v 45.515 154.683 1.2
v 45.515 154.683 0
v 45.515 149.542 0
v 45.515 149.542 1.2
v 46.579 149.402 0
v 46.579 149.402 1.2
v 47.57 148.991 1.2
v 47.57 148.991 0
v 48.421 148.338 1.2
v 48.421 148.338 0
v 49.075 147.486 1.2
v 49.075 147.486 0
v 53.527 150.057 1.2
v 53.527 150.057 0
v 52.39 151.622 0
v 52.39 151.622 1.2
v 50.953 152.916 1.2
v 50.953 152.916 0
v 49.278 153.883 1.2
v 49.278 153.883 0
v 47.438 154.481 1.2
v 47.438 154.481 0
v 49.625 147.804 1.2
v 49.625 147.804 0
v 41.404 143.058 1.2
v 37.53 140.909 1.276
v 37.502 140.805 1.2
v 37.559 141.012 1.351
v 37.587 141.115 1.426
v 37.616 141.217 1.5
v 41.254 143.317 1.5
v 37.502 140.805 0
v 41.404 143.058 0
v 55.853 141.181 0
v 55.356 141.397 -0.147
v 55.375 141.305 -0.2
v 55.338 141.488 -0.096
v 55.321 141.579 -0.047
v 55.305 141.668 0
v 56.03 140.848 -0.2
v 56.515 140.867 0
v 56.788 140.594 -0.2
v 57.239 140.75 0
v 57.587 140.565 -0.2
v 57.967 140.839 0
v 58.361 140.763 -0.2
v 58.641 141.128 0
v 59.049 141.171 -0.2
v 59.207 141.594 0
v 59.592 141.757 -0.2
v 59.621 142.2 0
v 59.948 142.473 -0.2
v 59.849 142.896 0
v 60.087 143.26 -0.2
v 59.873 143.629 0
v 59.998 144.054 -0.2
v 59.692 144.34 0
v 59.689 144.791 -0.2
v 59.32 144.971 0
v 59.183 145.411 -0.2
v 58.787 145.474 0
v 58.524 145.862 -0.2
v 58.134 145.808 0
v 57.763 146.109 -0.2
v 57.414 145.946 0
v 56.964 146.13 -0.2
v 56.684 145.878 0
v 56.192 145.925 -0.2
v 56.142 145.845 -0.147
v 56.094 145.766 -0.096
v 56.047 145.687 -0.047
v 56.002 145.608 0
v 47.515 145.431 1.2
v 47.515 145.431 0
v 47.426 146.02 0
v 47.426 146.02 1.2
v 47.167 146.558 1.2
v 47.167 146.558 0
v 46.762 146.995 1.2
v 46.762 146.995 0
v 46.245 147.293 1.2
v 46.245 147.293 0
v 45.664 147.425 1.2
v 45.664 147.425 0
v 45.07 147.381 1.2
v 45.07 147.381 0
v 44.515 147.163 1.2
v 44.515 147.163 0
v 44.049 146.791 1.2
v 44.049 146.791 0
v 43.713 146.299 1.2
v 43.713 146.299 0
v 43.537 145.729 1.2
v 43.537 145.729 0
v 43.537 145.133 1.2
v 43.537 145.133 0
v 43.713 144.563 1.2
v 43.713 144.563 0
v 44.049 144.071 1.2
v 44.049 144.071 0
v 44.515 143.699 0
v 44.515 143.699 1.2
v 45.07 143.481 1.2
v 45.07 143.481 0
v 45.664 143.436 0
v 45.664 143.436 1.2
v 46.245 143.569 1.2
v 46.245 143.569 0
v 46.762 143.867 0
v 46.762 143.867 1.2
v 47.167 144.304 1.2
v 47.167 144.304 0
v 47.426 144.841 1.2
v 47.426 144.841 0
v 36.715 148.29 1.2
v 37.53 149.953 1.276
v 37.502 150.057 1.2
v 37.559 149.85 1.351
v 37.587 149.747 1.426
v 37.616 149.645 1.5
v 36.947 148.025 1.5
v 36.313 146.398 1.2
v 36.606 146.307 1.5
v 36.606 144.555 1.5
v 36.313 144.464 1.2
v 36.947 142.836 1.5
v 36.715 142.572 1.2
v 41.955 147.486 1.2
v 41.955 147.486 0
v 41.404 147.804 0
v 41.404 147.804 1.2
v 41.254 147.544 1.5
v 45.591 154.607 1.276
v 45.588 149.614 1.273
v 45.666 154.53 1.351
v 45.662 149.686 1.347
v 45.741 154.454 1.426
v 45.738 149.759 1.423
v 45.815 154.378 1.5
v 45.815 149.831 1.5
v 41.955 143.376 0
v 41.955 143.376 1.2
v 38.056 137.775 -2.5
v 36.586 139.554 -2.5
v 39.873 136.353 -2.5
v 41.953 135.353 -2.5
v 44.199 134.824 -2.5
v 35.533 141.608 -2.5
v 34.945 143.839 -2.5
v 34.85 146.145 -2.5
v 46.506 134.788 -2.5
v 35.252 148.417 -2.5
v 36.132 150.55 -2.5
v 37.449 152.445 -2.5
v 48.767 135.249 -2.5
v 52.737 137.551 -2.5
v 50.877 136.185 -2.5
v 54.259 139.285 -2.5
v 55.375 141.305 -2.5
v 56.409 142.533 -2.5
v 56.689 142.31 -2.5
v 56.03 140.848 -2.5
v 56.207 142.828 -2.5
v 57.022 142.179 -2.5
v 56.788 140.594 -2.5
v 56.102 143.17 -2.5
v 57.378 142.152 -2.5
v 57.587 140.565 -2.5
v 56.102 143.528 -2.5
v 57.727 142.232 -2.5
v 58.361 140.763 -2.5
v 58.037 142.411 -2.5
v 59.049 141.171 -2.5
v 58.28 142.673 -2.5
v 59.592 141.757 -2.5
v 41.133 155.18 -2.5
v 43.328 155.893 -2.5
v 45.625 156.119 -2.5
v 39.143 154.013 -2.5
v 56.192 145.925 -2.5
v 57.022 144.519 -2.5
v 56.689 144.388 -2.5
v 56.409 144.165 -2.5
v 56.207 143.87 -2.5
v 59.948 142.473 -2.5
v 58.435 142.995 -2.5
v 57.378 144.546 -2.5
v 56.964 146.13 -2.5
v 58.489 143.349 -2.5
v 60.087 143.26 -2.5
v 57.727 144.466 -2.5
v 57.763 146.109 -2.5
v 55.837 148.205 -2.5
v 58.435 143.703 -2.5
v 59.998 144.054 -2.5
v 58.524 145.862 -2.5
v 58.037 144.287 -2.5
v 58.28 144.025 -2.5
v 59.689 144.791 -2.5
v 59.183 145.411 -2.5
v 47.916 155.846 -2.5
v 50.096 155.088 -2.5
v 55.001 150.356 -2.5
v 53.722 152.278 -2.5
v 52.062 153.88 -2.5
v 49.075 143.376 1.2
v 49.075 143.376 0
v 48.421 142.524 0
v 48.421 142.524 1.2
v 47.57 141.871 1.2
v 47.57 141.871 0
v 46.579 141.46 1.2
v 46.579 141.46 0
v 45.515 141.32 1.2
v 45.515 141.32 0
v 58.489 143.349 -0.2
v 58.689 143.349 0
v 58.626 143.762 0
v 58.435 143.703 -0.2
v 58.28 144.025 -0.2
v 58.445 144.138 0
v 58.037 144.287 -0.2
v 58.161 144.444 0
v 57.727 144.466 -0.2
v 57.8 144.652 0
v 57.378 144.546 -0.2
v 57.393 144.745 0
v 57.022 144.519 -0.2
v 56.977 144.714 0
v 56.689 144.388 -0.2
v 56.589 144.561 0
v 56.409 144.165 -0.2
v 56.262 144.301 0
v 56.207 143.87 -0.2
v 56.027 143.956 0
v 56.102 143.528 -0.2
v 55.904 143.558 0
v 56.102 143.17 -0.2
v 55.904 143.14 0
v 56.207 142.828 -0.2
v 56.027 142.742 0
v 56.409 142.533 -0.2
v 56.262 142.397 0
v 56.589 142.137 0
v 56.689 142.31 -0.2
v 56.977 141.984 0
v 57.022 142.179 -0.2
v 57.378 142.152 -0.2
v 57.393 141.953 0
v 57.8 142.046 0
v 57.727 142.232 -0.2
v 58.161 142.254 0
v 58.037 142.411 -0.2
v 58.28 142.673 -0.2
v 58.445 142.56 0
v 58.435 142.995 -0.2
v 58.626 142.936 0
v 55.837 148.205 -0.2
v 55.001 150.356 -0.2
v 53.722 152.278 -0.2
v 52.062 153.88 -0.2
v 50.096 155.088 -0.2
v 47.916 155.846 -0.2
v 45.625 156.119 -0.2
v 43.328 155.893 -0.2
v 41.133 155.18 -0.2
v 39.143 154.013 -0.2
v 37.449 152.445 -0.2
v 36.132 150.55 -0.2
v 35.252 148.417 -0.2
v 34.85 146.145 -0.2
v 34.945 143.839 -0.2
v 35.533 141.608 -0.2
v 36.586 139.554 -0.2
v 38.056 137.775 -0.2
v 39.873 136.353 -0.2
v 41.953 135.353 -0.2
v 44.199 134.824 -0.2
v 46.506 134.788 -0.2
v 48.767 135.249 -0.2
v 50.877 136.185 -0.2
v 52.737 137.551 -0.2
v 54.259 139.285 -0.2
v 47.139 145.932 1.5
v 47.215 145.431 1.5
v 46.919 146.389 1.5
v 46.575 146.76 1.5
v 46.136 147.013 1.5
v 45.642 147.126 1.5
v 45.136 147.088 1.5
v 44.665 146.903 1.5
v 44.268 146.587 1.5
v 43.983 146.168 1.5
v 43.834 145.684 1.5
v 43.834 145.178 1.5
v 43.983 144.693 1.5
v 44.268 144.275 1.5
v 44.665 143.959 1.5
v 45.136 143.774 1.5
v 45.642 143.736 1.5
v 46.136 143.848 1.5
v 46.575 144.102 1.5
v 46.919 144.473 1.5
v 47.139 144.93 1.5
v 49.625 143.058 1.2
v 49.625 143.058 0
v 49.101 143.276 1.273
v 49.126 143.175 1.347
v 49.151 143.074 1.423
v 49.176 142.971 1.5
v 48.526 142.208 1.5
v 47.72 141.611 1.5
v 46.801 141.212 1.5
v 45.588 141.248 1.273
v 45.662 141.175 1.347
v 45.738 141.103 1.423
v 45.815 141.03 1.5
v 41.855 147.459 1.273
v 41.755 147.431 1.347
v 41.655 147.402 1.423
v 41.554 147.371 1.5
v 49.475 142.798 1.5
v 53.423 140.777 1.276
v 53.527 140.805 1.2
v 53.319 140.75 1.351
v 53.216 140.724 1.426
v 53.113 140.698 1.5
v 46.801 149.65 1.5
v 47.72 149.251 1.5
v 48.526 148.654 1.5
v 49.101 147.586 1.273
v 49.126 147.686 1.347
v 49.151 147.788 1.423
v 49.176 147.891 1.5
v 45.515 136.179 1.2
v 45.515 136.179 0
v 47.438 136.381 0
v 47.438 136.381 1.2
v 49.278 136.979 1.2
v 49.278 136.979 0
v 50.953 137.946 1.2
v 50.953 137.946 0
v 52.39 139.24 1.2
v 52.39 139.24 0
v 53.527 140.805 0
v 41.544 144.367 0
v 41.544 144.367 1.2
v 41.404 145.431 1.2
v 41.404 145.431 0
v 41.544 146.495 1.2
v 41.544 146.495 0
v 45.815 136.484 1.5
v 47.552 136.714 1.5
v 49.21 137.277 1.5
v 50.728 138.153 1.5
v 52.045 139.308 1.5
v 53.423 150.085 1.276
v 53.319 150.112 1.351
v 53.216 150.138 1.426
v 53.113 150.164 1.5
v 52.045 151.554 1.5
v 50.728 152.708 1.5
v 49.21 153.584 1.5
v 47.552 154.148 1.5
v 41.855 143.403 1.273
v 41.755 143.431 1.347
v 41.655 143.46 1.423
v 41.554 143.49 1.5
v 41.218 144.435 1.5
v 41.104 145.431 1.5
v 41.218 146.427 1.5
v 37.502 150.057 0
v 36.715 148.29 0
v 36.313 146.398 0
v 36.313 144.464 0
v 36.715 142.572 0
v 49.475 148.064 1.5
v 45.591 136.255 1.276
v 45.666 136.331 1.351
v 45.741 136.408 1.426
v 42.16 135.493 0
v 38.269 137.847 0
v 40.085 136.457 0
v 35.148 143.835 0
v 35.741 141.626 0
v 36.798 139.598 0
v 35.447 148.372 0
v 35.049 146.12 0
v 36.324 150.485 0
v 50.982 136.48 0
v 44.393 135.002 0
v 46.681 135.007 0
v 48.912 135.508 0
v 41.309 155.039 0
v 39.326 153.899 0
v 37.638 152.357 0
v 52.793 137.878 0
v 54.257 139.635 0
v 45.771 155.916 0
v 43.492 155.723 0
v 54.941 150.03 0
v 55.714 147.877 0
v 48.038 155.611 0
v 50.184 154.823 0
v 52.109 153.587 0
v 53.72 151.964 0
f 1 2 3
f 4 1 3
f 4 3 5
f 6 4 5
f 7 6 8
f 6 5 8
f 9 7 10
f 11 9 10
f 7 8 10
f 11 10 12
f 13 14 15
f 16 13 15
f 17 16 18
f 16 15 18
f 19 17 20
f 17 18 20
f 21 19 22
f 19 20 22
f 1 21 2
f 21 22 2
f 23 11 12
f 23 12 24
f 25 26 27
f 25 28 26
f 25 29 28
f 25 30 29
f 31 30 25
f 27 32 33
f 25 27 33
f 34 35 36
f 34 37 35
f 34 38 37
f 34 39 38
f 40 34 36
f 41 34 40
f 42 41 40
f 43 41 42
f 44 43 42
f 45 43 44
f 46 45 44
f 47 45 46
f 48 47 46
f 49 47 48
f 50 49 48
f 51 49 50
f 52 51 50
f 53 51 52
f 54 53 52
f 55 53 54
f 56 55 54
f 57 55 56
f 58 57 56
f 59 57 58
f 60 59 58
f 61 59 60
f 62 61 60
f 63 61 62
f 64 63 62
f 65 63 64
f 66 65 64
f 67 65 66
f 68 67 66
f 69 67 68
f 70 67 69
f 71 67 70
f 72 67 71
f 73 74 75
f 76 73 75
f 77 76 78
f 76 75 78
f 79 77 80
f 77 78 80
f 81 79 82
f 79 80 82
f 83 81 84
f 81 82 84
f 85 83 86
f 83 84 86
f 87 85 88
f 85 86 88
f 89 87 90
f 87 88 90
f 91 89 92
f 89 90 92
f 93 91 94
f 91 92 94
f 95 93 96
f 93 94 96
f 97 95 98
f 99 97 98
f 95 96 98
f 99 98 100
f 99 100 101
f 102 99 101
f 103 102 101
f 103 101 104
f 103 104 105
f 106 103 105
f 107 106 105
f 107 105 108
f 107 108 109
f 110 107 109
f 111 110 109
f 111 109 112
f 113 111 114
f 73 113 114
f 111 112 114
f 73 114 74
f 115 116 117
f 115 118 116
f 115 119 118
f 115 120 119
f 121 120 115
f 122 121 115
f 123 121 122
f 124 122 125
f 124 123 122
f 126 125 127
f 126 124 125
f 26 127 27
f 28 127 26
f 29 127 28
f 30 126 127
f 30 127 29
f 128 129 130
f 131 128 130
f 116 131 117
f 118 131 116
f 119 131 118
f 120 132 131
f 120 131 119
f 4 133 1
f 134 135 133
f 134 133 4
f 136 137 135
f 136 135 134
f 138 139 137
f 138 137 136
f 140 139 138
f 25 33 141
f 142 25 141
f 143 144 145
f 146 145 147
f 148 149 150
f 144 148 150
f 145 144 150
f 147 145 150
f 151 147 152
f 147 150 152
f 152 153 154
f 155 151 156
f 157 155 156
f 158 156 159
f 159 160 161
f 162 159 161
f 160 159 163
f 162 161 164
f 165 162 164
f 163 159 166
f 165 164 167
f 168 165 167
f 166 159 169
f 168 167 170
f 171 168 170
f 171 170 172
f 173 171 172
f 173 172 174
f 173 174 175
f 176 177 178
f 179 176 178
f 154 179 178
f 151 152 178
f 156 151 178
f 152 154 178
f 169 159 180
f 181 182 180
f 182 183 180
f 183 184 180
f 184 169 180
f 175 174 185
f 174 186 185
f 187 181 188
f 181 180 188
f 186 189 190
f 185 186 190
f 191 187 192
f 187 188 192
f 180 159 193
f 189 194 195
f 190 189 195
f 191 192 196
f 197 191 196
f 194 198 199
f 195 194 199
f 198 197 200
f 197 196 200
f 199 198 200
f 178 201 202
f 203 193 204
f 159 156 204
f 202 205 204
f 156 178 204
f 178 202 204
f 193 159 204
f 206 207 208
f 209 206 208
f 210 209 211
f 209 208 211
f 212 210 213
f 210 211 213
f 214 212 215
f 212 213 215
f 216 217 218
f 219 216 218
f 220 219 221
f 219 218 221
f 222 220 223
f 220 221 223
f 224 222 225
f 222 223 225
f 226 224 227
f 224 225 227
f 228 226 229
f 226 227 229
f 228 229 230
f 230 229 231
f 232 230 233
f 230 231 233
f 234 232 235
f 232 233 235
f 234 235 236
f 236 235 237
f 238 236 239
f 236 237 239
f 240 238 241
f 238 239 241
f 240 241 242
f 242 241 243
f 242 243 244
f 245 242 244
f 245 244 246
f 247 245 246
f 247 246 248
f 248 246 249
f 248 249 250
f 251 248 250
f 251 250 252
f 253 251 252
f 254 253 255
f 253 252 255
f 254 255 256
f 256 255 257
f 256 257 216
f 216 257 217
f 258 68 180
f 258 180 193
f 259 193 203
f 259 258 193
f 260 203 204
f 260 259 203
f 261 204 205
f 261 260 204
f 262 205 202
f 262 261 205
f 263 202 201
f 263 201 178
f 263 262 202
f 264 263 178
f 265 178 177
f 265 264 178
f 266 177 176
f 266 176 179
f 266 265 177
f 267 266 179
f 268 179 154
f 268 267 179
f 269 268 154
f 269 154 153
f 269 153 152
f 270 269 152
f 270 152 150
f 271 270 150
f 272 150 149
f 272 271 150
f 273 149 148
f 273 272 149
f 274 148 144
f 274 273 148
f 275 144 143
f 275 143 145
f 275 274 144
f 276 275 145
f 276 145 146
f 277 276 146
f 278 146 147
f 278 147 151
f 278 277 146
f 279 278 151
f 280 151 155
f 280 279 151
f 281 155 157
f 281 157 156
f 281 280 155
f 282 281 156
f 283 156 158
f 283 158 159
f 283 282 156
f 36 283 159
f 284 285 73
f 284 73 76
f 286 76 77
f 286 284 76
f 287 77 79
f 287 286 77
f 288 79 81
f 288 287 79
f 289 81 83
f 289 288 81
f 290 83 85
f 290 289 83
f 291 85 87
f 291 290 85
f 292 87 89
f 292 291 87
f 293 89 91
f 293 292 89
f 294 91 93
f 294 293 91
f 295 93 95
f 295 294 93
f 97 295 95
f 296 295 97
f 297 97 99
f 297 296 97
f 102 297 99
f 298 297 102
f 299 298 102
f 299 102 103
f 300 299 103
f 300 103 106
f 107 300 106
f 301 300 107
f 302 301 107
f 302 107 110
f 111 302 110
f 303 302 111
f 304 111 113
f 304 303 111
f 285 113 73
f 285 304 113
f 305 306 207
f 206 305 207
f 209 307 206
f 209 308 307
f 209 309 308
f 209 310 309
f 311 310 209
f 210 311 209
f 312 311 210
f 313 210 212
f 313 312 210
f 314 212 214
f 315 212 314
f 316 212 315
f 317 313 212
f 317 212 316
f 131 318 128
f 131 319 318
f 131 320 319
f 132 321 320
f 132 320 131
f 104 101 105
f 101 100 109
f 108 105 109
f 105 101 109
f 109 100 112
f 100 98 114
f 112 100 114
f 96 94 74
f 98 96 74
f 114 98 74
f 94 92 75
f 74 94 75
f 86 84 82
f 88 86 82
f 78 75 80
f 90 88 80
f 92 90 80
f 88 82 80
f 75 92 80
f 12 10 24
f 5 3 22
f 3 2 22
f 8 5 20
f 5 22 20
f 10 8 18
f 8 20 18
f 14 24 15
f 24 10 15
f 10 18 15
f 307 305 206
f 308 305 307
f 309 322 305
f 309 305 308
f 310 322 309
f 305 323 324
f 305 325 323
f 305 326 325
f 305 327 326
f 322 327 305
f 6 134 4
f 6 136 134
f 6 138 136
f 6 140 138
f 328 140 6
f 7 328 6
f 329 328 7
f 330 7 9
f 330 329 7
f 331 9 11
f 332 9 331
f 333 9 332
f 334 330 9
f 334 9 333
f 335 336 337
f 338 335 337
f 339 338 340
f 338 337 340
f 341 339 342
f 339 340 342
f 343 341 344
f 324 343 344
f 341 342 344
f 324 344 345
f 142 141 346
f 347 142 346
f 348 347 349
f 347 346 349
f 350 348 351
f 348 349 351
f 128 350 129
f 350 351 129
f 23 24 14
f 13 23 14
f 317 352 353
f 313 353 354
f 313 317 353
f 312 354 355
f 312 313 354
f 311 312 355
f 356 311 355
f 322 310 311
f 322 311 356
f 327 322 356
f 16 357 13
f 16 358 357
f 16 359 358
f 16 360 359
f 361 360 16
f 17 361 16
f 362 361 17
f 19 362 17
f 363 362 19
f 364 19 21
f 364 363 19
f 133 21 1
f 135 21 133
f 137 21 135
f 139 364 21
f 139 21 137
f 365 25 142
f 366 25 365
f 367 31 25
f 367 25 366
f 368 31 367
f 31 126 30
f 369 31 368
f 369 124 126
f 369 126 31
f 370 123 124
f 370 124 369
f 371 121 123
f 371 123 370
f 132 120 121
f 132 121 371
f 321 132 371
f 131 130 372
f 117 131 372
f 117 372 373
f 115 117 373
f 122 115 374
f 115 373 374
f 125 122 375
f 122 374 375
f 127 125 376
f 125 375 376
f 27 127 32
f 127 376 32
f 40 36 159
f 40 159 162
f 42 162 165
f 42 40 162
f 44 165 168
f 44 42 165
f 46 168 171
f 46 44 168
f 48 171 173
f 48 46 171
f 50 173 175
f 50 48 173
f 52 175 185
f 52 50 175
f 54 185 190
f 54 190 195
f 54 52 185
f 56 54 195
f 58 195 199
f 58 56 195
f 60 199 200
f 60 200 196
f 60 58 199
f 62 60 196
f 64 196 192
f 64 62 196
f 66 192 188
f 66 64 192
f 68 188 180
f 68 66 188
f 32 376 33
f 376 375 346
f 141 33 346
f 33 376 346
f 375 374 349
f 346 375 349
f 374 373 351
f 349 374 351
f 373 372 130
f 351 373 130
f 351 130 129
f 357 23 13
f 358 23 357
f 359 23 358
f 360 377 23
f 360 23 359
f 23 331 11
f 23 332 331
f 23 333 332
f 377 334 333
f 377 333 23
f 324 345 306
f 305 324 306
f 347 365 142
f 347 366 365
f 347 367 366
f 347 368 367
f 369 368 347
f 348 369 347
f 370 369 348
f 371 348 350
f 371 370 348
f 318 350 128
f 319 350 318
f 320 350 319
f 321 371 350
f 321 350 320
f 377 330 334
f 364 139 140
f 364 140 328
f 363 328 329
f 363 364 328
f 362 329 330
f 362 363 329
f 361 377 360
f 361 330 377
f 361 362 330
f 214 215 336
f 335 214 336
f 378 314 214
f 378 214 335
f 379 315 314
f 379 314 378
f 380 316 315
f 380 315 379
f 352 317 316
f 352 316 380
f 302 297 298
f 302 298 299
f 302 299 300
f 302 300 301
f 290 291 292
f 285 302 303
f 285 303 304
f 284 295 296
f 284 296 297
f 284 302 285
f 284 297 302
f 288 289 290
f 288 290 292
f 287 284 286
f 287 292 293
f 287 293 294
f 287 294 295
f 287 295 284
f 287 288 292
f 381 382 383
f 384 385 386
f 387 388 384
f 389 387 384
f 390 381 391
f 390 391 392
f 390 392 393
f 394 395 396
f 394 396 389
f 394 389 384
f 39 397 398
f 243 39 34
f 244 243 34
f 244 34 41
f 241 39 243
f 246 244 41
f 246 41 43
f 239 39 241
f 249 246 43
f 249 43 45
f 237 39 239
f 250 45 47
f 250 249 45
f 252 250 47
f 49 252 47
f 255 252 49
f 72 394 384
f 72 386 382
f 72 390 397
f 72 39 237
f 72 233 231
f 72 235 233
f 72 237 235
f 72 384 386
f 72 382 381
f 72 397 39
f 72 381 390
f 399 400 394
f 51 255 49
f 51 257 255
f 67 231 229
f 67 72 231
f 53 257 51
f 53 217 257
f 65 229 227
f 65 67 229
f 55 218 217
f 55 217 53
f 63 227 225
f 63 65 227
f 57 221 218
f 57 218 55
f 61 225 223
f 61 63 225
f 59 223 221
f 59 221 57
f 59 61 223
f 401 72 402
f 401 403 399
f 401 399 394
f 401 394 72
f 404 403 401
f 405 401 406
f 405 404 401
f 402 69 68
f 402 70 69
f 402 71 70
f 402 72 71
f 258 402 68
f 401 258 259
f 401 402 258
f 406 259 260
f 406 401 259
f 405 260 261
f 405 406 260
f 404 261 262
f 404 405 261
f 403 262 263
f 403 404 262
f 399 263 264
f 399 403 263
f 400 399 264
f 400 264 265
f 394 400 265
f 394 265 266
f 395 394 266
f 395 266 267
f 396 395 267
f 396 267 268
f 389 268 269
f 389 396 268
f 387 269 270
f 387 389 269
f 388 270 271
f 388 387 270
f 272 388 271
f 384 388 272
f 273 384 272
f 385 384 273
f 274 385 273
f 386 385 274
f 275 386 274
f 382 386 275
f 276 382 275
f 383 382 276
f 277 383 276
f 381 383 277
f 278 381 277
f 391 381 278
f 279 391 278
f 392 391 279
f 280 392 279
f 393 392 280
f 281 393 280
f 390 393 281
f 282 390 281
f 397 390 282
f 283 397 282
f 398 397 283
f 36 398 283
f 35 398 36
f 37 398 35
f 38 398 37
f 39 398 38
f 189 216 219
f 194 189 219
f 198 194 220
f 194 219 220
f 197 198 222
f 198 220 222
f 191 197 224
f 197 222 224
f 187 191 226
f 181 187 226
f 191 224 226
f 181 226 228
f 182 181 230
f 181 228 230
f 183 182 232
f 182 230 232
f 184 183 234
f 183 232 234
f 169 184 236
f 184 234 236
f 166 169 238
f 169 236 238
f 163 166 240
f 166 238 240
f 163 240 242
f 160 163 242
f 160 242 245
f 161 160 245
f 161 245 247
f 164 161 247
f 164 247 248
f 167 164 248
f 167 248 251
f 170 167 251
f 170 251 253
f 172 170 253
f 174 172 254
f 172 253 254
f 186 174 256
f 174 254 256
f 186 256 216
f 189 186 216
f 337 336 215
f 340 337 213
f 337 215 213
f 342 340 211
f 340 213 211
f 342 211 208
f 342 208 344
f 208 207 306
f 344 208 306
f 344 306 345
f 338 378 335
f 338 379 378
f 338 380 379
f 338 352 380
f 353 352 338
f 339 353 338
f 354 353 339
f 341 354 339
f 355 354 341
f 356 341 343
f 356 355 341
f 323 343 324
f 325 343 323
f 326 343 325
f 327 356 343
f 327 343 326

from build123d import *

# Parameters (mm, degrees)
F1_DEPTH  = 1.5
F0_R      = 2
F2_R      = 2
F2_R_2    = 1.2
F3_DEPTH  = 2.5
F4_SIZE   = 0.3
F4_2_SIZE = 0.3
F4_3_SIZE = 0.3
F4_4_SIZE = 0.3
F5_SIZE   = 0.2


with BuildPart() as f1:
    # F0 (on Top) → F1 (new body)
    with BuildSketch(Plane.XY):
        with BuildLine():
            ThreePointArc((45.5146192143, 149.541586003), (47.5699658629, 148.9908575284), (49.0745840368, 147.4862393545))
            Line((49.0745840368, 147.4862393545), (49.6253125115, 147.8042025876))
            Line((49.6253125115, 147.8042025876), (53.5270926728, 150.056896414))
            ThreePointArc((53.5270926728, 150.056896414), (50.1406229225, 153.4433661644), (45.5146192143, 154.6829001221))
            Line((45.5146192143, 154.6829001221), (45.5146192143, 150.1775124692))
            Line((45.5146192143, 150.1775124692), (45.5146192143, 149.541586003))
        make_face()
    extrude(amount=F1_DEPTH)

    # F4#3
    f4_3_edges = [f1.edges().sort_by_distance(p)[0] for p in [
        (45.514619, 152.112243, 1.5),
        (47.569966, 148.990858, 1.5),
        (51.300838, 148.771568, 1.5),
        (50.140623, 153.443366, 1.5),
    ]]
    chamfer(f4_3_edges, length=F4_3_SIZE)


with BuildPart() as f1b:
    # F0 (on Top) → F1, piece 2 (new body)
    with BuildSketch(Plane.XY):
        with BuildLine():
            ThreePointArc((41.9546543919, 143.3755460574), (41.4039259172, 145.4308927059), (41.9546543919, 147.4862393545))
            Line((41.9546543919, 147.4862393545), (41.4039259172, 147.8042025876))
            Line((41.4039259172, 147.8042025876), (37.5021457559, 150.056896414))
            ThreePointArc((37.5021457559, 150.056896414), (36.2626117981, 145.4308927059), (37.5021457559, 140.8048889978))
            Line((37.5021457559, 140.8048889978), (41.4039259172, 143.0575828243))
            Line((41.4039259172, 143.0575828243), (41.9546543919, 143.3755460574))
        make_face()
    extrude(amount=F1_DEPTH)

    # F4
    f4_edges = [f1b.edges().sort_by_distance(p)[0] for p in [
        (39.7284, 142.090218, 1.5),
        (41.403926, 145.430893, 1.5),
        (39.7284, 148.771568, 1.5),
        (36.262612, 145.430893, 1.5),
    ]]
    chamfer(f4_edges, length=F4_SIZE)


with BuildPart() as f1c:
    # F0 (on Top) → F1, piece 3 (new body)
    with BuildSketch(Plane.XY):
        with BuildLine():
            Line((49.6253125115, 143.0575828243), (49.0745840368, 143.3755460574))
            ThreePointArc((49.0745840368, 143.3755460574), (47.5699658629, 141.8709278835), (45.5146192143, 141.3201994088))
            Line((45.5146192143, 141.3201994088), (45.5146192143, 140.6842729426))
            Line((45.5146192143, 140.6842729426), (45.5146192143, 136.1788852897))
            ThreePointArc((45.5146192143, 136.1788852897), (50.1406229225, 137.4184192475), (53.5270926728, 140.8048889978))
            Line((53.5270926728, 140.8048889978), (49.6253125115, 143.0575828243))
        make_face()
    extrude(amount=F1_DEPTH)

    # F4#2
    f4_2_edges = [f1c.edges().sort_by_distance(p)[0] for p in [
        (51.300838, 142.090218, 1.5),
        (47.569966, 141.870928, 1.5),
        (45.514619, 138.749542, 1.5),
        (50.140623, 137.418419, 1.5),
    ]]
    chamfer(f4_2_edges, length=F4_2_SIZE)


with BuildPart() as f1d:
    # F0 (on Top) → F1, piece 4 (new body)
    with BuildSketch(Plane.XY):
        with Locations((45.5146192143, 145.4308927059)):
            Circle(F0_R)
    extrude(amount=F1_DEPTH)

    # F4#4
    f4_4_edges = [f1d.edges().sort_by_distance(p)[0] for p in [
        (43.514619, 145.430893, 1.5),
    ]]
    chamfer(f4_4_edges, length=F4_4_SIZE)


with BuildPart() as f3:
    # F2 (on Top) → F3 (new body)
    with BuildSketch(Plane.XY):
        with BuildLine():
            ThreePointArc((55.3748145236, 141.3051501401), (55.994038114, 143.3268530716), (56.203173993, 145.4308927059))
            ThreePointArc((56.203173993, 145.4308927059), (56.2003138128, 145.67814603), (56.1917348027, 145.9252670277))
            ThreePointArc((56.1917348027, 145.9252670277), (34.9893327698, 147.2919538324), (55.3748145236, 141.3051501401))
        make_face()
        with Locations((45.5146192143, 145.4308927059)):
            Circle(F2_R, mode=Mode.SUBTRACT)
        with BuildLine():
            ThreePointArc((56.1917348027, 145.9252670277), (56.2003138128, 145.67814603), (56.203173993, 145.4308927059))
            ThreePointArc((56.203173993, 145.4308927059), (55.994038114, 143.3268530716), (55.3748145236, 141.3051501401))
            ThreePointArc((55.3748145236, 141.3051501401), (60.0458105409, 142.8615150987), (56.1917348027, 145.9252670277))
        make_face()
        with Locations((57.2885807137, 143.3490432316)):
            Circle(F2_R_2, mode=Mode.SUBTRACT)
        with Locations((45.5146192143, 145.4308927059)):
            Circle(F2_R)
    extrude(amount=-F3_DEPTH)

    # F5
    f5_edges = [f3.edges().sort_by_distance(p)[0] for p in [
        (34.989333, 147.291954, 0),
        (60.045811, 142.861515, 0),
        (56.088581, 143.349043, 0),
    ]]
    chamfer(f5_edges, length=F5_SIZE)


solid = Compound([f1.part, f1b.part, f1c.part, f1d.part, f3.part])
